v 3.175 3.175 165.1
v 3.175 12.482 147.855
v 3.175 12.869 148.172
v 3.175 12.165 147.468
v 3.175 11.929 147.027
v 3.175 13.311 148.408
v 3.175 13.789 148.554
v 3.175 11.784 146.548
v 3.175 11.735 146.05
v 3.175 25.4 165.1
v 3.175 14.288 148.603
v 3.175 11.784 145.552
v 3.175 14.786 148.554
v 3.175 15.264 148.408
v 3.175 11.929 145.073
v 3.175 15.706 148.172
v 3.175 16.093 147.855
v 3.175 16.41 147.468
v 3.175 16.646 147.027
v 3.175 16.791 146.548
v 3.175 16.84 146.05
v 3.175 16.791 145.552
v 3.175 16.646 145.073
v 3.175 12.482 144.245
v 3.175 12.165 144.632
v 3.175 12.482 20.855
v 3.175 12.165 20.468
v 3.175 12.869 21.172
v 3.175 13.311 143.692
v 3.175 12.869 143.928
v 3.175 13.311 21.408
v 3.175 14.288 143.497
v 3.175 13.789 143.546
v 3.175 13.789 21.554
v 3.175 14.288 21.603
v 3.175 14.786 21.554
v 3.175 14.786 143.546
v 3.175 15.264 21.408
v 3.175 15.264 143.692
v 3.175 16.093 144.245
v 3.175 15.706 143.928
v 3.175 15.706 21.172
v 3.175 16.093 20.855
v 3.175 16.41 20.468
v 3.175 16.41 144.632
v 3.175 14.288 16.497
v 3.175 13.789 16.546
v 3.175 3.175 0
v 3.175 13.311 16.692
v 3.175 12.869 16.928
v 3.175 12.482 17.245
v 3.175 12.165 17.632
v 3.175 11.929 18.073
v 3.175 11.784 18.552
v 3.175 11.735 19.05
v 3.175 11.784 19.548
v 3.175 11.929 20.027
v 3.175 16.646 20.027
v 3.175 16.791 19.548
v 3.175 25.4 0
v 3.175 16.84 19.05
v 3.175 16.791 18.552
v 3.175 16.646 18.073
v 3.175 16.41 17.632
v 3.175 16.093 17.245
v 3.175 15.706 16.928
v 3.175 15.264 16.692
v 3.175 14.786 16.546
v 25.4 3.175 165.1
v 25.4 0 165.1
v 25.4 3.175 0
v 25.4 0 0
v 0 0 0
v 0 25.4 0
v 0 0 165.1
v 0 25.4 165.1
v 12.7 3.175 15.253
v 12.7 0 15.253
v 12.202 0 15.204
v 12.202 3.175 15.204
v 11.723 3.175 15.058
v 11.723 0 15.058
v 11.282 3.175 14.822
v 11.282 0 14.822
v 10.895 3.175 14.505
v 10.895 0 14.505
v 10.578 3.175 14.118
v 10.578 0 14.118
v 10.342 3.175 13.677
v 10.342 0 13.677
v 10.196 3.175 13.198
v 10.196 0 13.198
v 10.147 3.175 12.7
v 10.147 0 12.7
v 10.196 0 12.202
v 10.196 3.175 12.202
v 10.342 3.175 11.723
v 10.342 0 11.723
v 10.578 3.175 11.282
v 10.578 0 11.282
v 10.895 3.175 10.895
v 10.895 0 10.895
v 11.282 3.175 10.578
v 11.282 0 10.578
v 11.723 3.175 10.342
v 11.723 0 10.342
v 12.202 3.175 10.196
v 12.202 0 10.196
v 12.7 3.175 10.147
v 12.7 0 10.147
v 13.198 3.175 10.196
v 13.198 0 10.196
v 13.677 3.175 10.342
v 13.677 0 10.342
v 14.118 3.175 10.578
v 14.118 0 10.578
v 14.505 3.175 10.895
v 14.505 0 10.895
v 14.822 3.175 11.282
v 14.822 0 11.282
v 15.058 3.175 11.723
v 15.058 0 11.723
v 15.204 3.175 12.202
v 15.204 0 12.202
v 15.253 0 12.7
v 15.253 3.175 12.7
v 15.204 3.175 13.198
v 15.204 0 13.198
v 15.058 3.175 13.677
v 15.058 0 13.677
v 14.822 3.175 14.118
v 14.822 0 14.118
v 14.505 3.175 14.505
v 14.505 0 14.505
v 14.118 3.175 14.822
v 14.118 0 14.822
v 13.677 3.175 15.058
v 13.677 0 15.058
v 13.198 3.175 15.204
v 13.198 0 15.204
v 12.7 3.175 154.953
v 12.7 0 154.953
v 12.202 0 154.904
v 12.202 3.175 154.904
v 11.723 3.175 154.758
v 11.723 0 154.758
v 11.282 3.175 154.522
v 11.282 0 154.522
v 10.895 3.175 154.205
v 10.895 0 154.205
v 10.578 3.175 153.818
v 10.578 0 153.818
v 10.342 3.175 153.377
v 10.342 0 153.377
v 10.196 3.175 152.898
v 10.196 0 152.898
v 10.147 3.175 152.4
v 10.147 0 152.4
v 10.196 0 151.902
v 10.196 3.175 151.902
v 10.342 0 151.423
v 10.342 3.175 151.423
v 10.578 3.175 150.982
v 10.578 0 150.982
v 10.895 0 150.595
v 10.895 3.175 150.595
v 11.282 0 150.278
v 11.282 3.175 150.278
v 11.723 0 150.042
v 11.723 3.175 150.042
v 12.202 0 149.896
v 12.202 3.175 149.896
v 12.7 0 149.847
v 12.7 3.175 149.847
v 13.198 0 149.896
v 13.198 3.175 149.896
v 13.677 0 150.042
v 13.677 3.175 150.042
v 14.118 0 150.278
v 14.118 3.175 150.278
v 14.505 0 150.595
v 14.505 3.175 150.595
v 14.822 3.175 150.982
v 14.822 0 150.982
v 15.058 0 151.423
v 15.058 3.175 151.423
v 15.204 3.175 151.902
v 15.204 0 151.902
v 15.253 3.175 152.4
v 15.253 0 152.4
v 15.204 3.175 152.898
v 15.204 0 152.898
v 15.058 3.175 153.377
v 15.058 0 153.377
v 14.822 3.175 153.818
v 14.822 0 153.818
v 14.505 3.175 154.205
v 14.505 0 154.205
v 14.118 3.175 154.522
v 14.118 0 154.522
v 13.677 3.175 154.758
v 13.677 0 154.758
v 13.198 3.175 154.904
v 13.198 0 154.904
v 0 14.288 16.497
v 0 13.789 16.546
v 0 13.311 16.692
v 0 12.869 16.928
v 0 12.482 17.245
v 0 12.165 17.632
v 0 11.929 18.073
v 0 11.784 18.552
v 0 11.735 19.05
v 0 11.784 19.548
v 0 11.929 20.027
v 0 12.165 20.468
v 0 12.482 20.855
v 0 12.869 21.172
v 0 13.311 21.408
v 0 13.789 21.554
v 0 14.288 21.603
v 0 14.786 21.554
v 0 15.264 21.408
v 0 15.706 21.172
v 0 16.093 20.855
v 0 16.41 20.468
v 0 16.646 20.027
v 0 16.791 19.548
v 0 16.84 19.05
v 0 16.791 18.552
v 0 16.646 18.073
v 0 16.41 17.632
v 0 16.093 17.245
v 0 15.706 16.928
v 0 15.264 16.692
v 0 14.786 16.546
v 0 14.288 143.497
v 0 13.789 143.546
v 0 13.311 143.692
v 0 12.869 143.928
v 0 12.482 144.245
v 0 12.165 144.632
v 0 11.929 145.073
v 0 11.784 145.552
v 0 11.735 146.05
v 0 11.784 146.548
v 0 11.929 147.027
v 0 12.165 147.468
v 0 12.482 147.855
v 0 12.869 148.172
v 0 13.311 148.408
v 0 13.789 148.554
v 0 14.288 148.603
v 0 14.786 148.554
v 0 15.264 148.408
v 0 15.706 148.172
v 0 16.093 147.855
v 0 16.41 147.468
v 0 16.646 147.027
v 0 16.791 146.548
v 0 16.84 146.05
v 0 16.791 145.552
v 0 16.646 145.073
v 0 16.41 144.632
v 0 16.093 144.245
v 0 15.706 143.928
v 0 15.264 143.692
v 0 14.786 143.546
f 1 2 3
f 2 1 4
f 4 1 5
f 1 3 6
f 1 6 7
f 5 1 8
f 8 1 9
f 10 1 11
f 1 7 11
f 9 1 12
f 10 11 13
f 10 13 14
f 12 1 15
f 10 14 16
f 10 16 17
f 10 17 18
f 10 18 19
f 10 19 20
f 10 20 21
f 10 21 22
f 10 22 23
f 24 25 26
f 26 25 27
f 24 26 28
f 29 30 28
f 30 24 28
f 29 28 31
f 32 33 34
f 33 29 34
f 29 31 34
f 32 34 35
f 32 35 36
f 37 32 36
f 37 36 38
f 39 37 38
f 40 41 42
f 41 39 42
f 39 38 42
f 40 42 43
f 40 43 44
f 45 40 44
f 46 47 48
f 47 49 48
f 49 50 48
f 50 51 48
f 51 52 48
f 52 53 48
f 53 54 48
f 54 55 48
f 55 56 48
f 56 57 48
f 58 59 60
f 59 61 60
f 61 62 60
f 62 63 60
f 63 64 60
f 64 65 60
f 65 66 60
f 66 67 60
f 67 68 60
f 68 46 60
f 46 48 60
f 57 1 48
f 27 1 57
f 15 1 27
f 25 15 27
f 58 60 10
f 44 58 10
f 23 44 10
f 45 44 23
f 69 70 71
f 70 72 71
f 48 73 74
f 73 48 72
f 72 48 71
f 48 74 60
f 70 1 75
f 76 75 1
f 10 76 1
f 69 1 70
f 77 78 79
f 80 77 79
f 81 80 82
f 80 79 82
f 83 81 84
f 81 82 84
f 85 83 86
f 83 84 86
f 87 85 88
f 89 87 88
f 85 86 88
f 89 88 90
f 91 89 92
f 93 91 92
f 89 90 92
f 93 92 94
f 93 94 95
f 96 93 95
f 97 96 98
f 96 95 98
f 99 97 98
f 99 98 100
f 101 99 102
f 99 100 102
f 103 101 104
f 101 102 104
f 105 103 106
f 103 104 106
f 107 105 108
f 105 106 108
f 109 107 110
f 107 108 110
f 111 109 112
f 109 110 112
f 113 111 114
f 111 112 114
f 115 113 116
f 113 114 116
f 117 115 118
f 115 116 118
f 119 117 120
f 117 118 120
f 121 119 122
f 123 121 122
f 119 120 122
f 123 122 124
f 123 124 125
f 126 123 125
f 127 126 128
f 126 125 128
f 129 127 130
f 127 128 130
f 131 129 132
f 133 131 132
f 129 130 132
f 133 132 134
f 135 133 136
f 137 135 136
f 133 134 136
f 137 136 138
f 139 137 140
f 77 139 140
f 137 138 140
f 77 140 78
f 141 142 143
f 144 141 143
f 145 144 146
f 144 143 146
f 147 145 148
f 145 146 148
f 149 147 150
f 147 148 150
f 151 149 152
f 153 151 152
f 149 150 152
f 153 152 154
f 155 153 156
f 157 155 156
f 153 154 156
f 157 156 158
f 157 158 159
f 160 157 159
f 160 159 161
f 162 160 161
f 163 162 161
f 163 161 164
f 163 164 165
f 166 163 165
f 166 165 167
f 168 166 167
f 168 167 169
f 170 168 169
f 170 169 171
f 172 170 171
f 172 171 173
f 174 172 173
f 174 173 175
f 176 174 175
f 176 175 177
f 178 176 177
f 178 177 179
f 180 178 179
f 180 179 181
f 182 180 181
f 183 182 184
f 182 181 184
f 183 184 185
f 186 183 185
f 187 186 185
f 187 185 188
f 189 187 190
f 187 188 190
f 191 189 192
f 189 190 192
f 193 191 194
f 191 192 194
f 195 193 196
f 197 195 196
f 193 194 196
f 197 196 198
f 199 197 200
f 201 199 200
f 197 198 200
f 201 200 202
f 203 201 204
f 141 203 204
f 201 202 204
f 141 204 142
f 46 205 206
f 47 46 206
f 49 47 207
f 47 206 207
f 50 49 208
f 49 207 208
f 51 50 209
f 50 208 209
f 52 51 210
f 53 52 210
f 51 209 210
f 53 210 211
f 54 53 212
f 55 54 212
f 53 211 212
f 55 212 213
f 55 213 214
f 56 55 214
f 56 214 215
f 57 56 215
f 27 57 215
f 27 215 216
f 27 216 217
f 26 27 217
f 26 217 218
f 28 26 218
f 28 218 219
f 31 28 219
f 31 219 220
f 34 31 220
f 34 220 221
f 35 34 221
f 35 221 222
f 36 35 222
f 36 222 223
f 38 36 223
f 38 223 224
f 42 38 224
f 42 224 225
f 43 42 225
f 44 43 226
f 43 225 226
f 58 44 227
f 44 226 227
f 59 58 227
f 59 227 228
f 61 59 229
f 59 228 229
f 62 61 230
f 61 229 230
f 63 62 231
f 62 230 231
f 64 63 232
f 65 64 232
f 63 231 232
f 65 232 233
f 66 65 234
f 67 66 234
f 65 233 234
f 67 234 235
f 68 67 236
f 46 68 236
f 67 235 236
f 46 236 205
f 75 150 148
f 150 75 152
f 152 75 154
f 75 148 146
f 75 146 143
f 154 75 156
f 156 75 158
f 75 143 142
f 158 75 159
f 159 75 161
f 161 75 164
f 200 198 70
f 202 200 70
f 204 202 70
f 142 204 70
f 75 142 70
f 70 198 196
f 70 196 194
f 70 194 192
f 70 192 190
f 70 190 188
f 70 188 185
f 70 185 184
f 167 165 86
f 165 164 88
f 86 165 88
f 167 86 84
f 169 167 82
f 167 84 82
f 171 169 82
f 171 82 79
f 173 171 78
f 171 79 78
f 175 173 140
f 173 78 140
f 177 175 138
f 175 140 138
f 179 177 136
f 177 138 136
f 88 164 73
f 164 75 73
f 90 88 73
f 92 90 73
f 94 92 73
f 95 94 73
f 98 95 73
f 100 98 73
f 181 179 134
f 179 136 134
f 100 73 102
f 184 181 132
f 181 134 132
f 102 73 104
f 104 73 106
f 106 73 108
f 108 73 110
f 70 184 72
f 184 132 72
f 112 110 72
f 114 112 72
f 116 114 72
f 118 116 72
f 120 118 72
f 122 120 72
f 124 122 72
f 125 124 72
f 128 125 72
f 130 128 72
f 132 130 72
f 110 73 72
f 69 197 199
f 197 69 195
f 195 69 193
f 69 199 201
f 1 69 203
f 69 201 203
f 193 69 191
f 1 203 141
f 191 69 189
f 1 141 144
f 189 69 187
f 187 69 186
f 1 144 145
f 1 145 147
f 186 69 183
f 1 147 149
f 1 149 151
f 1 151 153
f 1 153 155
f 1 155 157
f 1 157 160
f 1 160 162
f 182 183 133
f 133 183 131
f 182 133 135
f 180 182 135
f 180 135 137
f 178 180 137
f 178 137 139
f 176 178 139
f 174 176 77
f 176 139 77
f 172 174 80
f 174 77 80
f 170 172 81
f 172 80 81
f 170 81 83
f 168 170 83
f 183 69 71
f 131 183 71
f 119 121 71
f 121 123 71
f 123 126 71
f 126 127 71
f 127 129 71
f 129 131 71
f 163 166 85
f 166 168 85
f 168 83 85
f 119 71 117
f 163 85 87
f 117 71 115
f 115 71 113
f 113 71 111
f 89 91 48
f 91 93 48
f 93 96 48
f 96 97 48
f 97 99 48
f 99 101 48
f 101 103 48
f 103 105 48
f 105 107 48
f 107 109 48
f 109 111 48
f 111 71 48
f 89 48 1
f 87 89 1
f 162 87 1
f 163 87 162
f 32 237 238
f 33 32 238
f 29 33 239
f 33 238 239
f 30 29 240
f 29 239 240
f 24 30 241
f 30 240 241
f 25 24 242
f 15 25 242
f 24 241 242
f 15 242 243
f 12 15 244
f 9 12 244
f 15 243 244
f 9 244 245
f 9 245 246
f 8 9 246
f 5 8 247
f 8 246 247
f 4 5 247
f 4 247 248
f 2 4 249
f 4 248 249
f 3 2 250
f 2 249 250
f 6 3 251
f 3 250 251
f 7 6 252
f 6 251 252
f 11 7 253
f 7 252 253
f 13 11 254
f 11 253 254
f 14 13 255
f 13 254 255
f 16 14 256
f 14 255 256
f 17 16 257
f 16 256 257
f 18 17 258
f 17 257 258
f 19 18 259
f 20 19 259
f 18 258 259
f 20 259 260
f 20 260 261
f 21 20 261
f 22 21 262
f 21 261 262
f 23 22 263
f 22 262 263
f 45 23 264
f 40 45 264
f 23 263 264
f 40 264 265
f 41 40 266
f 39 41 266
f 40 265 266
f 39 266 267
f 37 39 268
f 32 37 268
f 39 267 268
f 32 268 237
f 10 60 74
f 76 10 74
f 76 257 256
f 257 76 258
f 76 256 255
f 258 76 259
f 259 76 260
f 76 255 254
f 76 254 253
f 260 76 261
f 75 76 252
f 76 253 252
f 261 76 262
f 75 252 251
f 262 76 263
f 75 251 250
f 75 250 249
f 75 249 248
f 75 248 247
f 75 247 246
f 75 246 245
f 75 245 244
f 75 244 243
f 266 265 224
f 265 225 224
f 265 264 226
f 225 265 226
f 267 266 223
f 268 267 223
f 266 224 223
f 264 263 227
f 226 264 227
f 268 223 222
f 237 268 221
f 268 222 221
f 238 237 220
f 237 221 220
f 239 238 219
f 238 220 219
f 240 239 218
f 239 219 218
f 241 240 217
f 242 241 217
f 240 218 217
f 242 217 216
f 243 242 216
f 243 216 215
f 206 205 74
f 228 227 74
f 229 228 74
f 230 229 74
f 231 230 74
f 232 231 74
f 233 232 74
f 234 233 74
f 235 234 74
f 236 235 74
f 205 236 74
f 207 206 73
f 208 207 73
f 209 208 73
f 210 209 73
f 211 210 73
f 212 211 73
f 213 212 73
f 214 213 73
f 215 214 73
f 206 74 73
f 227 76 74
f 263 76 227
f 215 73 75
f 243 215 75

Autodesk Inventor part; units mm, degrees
ref_plane "YZ Plane" through (0, 0, 0) normal (1, 0, 0) x (0, 1, 0)
ref_plane "XZ Plane" through (0, 0, 0) normal (0, 1, 0) x (-1, 0, 0)
ref_plane "XY Plane" through (0, 0, 0) normal (0, 0, 1) x (1, 0, 0)
sketch "Sketch1" plane through (0, 0, 0) normal (0, 0, 1) x (1, 0, 0)
  line L0 (0, 0) -> (3.175, 0)
  line L1 (3.175, 0) -> (3.175, 25.4)
  line L2 (3.175, 25.4) -> (0, 25.4)
  line L3 (0, 25.4) -> (0, 0)
  line L4 (0, 0) -> (25.4, 0)
  line L5 (25.4, 0) -> (25.4, 3.175)
  line L6 (25.4, 3.175) -> (0, 3.175)
  line L7 (0, 3.175) -> (0, 0)
  dimension "d0" = 3.175
  dimension "d1" = 25.4
extrude "Extrusion1" add sketch "Sketch1" along normal blind 165.1
sketch "Sketch2" plane through (3.175, 3.175, 0) normal (1, 0, 0) x (0, 0, -1)
  line L0 (-165.1, 0) -> (-165.1, 22.225) projected
  line L1 (0, -3.175) -> (-165.1, -3.175) projected
  point P0 (-146.05, 11.1125)
  point P1 (-19.05, 11.1125)
  dimension "d4" = 19.05
  dimension "d5" = 127
  dimension "d6" = 14.2875
hole "Hole1" at (3.175, 14.2875, 146.05) at (3.175, 14.2875, 19.05) direction (-1, 0, 0) diameter 5.1054 end through all clearance for "Flat Head Machine Screw (82)" size "#10" standard "Ansi Unified Screw Threads"
sketch "Sketch3" plane through (3.175, 3.175, 0) normal (0, 1, 0) x (1, 0, 0)
  line L0 (22.225, 0) -> (0, 0) projected
  line L1 (22.225, 0) -> (22.225, -165.1) projected
  line L2 (0, 0) -> (0, -165.1) projected
  point P0 (-3.175, 0)
  point P1 (9.525, -152.4)
  point P2 (9.525, -12.7)
  dimension "d14" = 12.7
  dimension "d15" = 139.7
  dimension "d16" = 12.7
  dimension "d17" = 9.525
hole "Hole2" at (12.7, 3.175, 152.4) at (12.7, 3.175, 12.7) direction (0, -1, 0) diameter 5.1054 end through all clearance for "Flat Head Machine Screw (82)" size "#10" standard "Ansi Unified Screw Threads"
properties part number "FRA_014_AngleBracketGearbox" material "Aluminum 6061"
